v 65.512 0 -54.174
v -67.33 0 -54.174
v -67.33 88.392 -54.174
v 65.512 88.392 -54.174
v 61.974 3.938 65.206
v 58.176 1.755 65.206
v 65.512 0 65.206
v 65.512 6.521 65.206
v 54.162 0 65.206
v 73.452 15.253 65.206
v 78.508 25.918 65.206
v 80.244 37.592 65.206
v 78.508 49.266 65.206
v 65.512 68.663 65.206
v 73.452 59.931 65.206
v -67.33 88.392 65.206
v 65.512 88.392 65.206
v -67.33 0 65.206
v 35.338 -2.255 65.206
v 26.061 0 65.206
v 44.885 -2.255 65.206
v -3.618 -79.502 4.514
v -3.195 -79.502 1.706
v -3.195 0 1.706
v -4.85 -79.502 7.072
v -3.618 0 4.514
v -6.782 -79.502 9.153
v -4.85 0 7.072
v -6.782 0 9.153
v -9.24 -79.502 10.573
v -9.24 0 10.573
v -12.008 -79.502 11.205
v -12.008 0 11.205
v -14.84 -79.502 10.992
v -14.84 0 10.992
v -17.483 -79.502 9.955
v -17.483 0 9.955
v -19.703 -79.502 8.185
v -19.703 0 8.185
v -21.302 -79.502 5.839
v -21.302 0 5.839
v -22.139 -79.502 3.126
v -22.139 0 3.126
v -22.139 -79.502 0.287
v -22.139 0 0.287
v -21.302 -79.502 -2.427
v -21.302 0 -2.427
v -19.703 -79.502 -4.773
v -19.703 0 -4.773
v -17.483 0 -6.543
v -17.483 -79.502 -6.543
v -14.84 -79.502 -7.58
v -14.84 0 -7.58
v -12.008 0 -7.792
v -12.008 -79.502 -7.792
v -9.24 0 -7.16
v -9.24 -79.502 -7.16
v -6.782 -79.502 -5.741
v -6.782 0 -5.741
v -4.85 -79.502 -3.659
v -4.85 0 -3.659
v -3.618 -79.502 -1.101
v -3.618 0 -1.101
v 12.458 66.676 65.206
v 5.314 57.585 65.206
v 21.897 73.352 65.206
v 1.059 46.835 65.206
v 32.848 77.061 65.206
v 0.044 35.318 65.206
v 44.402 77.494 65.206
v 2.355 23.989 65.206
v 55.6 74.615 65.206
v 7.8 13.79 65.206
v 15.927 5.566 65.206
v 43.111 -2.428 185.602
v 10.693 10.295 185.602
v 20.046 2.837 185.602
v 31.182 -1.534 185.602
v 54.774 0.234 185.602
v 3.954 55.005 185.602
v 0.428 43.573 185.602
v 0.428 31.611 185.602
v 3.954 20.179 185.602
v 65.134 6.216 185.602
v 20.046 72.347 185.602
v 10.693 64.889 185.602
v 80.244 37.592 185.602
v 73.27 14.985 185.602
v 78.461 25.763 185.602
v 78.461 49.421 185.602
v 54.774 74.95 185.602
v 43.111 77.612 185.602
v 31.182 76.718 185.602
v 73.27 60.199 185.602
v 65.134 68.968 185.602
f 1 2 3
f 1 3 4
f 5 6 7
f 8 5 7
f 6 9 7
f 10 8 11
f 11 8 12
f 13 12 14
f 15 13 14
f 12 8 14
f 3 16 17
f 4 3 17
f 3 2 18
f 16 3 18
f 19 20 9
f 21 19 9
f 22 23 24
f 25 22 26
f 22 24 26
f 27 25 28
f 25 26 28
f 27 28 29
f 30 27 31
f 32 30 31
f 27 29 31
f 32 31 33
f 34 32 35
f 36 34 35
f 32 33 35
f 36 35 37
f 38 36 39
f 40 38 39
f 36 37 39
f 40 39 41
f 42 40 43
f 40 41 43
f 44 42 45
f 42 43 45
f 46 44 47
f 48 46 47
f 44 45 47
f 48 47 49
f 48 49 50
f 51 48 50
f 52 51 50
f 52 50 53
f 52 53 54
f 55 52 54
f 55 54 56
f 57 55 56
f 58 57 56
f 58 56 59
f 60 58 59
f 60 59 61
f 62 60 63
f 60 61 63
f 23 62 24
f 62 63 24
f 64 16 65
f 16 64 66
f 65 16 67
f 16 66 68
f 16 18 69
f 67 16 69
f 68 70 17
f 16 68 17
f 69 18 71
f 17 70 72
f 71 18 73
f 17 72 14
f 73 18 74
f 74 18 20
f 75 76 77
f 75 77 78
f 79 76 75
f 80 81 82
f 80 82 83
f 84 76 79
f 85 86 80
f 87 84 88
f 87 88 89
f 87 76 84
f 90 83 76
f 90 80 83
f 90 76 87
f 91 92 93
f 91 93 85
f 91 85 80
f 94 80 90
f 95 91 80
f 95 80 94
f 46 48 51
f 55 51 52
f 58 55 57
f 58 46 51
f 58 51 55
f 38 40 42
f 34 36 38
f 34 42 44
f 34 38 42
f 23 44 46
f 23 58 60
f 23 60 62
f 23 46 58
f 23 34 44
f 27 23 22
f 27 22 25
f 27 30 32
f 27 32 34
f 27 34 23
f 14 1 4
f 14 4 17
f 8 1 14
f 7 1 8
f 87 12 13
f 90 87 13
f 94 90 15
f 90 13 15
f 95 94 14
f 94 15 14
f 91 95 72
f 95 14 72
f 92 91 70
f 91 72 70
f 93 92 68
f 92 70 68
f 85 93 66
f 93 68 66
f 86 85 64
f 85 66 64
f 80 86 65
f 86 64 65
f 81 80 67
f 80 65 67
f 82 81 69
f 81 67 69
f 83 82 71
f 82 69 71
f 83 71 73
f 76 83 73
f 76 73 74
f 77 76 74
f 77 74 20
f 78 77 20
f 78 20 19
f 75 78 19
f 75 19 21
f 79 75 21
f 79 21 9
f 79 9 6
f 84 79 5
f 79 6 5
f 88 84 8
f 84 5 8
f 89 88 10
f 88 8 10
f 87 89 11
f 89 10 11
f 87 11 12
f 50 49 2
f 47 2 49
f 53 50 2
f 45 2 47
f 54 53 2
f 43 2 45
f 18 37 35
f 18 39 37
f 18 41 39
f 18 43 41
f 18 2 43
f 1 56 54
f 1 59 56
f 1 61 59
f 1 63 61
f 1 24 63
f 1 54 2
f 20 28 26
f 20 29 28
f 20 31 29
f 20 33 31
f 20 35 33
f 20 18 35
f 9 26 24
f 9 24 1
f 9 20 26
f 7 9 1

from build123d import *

# Parameters (mm, degrees)
F0_W     = 132.842
F0_H     = 119.38
F1_DEPTH = 88.392
F2_R     = 40.132
F3_DEPTH = 120.396
F4_R     = 9.525
F5_DEPTH = 79.502


with BuildPart() as f1:
    # F0 (on Front) → F1 (new body)
    with BuildSketch(Plane.XZ):
        with Locations((-0.909254, 5.516134)):
            Rectangle(F0_W, F0_H)
    extrude(amount=-F1_DEPTH)

    # F2 (on face) → F3 (join)
    with BuildSketch(Plane.XY.offset(65.206134)):
        with Locations((40.111746, 37.592)):
            Circle(F2_R)
    extrude(amount=F3_DEPTH)

    # F4 (on face) → F5 (join)
    with BuildSketch(Plane.XZ):
        with Locations((-12.720254, 1.706134)):
            Circle(F4_R)
    extrude(amount=F5_DEPTH)


solid = f1.part
